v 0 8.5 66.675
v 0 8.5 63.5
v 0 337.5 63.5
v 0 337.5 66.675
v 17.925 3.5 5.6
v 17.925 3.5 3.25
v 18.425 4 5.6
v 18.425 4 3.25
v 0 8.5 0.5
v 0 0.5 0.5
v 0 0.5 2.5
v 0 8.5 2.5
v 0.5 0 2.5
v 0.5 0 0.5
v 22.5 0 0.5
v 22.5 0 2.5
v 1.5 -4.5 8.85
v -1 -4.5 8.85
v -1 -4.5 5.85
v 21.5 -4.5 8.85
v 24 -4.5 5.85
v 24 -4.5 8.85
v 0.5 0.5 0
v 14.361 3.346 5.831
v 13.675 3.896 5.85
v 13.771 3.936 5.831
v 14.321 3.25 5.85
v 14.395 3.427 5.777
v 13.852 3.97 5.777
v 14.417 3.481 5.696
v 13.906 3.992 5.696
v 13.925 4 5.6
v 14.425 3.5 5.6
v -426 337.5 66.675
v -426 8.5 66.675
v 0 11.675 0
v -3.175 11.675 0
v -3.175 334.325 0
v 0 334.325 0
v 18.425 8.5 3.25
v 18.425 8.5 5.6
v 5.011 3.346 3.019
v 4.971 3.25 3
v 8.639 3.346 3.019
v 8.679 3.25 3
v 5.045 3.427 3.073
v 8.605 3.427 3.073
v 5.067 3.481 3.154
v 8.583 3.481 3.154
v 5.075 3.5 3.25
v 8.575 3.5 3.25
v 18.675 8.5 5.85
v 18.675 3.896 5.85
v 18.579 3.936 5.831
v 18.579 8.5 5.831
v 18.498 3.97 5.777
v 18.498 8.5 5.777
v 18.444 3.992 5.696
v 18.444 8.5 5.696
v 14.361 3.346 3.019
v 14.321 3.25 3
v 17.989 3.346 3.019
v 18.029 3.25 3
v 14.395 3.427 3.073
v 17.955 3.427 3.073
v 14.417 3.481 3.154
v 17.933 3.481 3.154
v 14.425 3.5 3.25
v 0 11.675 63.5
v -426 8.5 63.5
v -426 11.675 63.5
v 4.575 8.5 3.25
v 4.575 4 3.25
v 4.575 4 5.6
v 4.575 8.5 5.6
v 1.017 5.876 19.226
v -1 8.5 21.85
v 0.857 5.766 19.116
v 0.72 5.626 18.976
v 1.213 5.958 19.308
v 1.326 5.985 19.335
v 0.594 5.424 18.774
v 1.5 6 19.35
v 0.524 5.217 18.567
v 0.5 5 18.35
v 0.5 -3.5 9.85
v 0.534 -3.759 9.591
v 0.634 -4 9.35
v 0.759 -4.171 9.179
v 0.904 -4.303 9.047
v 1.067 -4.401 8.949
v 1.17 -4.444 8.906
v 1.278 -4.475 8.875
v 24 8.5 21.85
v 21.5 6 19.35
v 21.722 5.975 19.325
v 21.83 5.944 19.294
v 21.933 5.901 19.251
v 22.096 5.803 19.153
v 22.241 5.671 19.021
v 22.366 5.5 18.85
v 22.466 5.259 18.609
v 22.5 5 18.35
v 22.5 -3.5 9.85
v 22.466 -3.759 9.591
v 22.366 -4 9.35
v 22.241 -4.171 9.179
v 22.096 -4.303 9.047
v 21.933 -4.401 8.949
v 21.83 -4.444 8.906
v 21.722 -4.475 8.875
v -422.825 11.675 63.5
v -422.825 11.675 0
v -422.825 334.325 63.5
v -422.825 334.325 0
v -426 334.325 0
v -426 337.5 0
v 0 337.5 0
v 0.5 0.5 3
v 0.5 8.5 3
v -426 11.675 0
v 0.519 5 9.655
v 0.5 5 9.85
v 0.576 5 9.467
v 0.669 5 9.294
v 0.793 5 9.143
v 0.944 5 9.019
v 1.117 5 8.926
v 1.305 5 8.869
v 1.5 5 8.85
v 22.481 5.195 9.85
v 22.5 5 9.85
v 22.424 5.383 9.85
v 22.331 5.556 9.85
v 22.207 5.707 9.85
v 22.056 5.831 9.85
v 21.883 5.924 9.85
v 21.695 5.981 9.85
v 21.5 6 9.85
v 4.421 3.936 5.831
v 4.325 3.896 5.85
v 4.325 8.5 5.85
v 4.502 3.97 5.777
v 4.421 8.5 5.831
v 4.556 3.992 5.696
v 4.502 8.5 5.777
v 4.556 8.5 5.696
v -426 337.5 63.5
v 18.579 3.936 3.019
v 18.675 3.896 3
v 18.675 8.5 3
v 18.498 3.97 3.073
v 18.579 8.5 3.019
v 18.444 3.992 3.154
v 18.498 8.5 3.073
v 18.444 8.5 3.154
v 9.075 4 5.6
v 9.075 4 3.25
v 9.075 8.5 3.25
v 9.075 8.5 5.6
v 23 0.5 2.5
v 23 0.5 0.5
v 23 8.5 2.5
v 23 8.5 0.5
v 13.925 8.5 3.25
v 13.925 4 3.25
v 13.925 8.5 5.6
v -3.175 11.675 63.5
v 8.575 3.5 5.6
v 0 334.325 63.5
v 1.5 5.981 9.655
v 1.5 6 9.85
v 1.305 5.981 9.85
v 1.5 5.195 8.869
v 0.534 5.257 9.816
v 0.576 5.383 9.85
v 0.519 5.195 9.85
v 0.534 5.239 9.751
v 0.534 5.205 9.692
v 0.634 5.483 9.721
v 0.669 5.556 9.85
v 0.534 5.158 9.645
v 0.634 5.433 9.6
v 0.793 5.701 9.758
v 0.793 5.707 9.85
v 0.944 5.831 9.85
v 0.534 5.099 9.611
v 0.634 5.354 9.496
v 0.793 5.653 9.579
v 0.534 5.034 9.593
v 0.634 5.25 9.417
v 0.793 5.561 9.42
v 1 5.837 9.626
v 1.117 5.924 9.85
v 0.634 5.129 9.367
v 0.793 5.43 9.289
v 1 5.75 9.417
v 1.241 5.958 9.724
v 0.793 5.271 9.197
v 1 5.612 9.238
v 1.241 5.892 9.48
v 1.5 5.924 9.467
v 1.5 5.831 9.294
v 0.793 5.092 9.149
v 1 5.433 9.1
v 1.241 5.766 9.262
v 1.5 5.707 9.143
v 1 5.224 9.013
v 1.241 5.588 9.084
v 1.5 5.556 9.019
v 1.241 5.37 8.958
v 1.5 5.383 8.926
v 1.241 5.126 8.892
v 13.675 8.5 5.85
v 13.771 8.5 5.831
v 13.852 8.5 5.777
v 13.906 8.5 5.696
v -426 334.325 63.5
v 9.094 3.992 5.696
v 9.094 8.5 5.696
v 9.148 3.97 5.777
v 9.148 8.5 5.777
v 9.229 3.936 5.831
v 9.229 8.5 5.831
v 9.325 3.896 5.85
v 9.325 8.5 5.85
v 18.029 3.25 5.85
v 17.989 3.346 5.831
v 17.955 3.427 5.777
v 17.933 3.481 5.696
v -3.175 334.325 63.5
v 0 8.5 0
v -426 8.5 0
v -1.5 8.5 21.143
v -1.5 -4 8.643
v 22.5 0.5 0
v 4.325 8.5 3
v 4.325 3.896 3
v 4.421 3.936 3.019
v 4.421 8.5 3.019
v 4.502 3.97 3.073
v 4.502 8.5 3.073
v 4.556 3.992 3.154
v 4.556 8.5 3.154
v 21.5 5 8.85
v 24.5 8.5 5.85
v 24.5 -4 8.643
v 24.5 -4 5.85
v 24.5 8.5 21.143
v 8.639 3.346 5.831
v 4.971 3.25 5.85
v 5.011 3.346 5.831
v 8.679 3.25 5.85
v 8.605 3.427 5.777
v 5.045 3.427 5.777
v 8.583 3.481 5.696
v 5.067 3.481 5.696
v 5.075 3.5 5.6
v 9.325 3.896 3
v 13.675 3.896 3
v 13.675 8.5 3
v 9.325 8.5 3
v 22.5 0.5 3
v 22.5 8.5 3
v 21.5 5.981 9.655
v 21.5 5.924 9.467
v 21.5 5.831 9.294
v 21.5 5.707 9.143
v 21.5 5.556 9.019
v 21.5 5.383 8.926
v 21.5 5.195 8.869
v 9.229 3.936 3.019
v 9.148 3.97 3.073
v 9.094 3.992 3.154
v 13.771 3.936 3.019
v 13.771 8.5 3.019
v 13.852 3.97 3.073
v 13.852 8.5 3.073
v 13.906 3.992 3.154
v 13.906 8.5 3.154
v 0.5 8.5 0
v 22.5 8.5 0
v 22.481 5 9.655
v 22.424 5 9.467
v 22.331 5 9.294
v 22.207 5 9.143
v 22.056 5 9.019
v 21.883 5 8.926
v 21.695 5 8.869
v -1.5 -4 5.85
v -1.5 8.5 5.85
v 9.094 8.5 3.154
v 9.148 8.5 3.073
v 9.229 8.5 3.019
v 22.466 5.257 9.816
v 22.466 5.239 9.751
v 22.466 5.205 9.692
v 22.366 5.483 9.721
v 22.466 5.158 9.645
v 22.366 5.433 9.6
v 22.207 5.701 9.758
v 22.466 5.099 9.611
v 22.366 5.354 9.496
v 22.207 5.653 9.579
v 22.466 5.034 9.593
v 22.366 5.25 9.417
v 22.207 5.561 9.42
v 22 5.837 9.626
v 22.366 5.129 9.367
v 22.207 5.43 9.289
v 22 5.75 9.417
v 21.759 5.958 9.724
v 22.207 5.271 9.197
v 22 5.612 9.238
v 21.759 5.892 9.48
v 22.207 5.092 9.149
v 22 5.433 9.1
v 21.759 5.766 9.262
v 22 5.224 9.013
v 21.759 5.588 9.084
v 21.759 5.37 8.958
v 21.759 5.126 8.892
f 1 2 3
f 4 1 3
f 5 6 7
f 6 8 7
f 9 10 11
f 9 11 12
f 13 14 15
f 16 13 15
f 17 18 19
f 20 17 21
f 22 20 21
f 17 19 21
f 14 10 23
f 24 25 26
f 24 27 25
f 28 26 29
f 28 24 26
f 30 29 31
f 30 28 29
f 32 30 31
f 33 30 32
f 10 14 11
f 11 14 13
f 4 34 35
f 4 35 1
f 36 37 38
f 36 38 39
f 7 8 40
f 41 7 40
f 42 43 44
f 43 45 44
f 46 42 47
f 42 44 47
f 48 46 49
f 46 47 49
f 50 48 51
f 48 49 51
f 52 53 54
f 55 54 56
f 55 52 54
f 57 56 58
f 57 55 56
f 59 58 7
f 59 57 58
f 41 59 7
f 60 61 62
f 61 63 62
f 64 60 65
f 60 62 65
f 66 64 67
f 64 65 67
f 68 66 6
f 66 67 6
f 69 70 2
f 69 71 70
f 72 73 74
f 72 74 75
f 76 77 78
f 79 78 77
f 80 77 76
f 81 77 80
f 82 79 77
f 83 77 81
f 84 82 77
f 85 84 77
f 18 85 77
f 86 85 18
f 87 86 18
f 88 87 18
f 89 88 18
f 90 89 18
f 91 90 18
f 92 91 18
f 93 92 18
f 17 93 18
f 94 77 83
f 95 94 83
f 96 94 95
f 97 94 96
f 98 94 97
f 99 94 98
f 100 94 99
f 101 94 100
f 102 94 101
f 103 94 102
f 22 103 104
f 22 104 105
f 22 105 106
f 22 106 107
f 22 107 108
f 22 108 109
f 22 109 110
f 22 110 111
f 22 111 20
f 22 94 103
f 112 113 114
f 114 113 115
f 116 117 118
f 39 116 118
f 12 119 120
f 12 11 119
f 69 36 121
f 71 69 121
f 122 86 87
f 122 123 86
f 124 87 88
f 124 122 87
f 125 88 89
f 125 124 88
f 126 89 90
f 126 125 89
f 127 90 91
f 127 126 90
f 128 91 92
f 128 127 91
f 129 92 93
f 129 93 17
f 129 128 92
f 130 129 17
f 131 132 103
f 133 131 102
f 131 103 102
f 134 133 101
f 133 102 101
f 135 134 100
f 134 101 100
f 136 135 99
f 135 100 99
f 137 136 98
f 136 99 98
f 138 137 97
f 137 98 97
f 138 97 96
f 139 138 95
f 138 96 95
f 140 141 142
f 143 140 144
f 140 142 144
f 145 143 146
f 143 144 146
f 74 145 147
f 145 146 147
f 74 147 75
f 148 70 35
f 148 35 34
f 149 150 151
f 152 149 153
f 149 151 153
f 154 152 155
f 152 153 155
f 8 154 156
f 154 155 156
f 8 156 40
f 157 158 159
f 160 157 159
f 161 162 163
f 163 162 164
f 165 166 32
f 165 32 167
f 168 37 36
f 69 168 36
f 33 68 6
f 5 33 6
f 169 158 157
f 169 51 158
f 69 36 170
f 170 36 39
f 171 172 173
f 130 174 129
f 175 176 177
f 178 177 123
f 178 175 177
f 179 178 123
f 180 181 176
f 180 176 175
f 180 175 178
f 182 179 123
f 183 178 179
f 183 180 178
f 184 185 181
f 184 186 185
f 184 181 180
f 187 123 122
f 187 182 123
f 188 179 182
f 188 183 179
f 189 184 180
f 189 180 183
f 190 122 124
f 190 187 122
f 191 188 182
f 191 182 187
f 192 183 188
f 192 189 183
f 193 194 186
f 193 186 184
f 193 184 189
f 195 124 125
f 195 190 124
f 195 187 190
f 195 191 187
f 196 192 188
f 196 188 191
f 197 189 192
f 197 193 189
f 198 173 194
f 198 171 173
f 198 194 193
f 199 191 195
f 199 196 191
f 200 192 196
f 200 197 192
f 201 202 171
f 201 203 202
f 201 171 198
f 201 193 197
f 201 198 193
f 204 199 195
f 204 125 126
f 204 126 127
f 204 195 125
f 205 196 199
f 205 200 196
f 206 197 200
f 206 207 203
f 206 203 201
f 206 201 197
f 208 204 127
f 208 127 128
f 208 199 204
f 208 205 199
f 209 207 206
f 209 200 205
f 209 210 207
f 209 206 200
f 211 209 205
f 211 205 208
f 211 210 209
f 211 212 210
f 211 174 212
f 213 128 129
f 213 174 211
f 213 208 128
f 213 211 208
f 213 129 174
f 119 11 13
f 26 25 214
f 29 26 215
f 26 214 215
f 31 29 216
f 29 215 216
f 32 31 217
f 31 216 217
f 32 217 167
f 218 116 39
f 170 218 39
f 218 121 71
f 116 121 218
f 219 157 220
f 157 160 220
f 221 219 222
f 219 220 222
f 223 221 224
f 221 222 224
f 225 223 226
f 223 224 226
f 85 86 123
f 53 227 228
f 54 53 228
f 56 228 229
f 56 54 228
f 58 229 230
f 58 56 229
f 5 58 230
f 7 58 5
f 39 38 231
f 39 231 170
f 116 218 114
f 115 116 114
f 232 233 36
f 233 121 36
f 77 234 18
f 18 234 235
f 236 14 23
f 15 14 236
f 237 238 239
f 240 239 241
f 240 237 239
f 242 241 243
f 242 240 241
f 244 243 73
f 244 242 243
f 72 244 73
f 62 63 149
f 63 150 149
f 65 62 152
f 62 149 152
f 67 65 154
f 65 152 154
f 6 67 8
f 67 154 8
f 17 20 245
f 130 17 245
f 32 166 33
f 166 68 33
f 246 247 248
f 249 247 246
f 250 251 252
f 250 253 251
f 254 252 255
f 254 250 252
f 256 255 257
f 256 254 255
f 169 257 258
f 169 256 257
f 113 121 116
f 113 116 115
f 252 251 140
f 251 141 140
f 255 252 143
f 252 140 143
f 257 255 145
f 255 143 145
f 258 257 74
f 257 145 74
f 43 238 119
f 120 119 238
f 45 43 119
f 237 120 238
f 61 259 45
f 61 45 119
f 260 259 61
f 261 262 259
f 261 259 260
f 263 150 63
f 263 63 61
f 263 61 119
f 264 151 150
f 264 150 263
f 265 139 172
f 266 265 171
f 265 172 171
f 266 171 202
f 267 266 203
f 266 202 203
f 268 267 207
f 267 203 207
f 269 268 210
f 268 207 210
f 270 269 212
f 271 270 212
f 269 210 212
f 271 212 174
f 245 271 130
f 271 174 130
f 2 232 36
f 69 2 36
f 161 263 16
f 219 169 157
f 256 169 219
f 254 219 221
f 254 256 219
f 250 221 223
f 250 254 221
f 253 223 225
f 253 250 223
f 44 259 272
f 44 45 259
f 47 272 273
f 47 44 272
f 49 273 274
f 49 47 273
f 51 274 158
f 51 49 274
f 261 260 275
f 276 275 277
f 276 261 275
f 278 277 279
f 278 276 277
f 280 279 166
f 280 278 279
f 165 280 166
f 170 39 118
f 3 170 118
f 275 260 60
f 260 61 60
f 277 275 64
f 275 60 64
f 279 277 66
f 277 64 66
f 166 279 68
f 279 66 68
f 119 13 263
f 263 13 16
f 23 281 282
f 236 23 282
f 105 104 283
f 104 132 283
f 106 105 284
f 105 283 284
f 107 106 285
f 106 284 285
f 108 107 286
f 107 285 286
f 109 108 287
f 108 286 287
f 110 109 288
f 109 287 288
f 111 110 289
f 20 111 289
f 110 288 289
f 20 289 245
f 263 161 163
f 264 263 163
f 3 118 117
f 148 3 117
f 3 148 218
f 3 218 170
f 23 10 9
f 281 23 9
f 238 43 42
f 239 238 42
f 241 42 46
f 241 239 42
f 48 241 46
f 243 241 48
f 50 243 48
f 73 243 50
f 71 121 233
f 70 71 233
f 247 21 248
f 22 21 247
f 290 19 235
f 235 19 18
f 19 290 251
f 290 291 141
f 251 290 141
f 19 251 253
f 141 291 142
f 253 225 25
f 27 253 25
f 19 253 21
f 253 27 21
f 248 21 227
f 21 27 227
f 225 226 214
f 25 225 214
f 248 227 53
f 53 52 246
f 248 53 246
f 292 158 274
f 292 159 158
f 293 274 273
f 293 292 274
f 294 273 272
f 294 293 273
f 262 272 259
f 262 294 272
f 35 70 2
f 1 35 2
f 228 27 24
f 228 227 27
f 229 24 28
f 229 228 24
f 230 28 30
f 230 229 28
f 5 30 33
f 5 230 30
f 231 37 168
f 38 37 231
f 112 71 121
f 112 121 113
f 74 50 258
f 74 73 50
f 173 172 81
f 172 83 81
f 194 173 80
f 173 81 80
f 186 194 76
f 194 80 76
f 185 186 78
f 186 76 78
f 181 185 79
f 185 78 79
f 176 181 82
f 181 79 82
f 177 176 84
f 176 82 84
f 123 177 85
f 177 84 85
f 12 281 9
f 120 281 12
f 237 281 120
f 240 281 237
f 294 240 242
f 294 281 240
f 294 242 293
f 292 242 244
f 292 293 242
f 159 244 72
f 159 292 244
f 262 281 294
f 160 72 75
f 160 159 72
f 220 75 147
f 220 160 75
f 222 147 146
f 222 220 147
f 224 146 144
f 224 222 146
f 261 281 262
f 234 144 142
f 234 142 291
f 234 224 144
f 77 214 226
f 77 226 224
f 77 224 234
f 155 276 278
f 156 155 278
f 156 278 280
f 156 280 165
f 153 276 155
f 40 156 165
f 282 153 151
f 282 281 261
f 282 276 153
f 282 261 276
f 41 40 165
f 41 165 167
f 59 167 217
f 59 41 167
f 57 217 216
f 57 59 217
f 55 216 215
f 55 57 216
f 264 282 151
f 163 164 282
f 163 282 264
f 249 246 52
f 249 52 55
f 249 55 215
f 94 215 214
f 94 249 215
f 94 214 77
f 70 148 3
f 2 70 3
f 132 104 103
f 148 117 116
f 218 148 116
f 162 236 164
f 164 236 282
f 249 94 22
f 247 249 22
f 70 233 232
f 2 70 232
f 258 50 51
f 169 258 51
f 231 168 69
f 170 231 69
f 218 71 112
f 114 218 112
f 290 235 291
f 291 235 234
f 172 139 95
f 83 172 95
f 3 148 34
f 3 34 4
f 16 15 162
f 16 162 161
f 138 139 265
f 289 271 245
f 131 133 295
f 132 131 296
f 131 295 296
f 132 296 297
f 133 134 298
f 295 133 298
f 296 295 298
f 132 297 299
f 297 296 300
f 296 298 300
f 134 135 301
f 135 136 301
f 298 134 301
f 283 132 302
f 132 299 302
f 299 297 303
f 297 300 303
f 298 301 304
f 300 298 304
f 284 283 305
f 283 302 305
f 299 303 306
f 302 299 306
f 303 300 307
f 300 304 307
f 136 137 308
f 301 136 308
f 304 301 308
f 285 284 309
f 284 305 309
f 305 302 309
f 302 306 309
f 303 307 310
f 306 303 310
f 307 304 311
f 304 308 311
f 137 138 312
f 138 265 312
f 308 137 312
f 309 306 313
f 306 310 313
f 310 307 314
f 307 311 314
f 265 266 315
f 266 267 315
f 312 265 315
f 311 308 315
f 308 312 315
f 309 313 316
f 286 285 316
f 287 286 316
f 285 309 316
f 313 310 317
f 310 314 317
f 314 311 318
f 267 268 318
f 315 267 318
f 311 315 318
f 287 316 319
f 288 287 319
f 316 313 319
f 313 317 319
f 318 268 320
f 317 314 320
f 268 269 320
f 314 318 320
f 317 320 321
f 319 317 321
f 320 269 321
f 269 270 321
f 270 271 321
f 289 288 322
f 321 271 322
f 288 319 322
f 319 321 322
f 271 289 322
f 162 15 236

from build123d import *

# Parameters (mm, degrees)
F0_W      = 23
F0_H      = 8.5
F1_DEPTH  = 3
F2_W      = 4.5
F2_H      = 5
F3_DEPTH  = 2.85
F4_W      = 26
F4_H      = 13
F5_DEPTH  = 3
F7_DEPTH  = 26
F8_SIZE   = 0.5
F9_R      = 0.25
F10_SIZE  = 0.5
F12_DEPTH = 63.5
F11_W     = 3.175
F11_H     = 322.65
F13_DEPTH = 63.5
F14_W     = 426
F14_H     = 329
F15_DEPTH = 3.175
F17_START = -2
F17_DEPTH = 22
F18_SIZE  = 0.5
F19_R     = 1


# Not quite as in the source:
# - a length typed as a fraction of an inch, garbled in the dataset ("3 / 203.2 mm" for 3/8 in), is restored


with BuildPart() as f1:
    # F0 (on Top) → F1 (new body)
    with BuildSketch(Plane.XY):
        with Locations((11.5, 4.25)):
            Rectangle(F0_W, F0_H)
    extrude(amount=F1_DEPTH)

    # F2 (on face) → F3 (join)
    with BuildSketch(Plane.XY.offset(3)):
        with Locations((6.825, 6)):
            Rectangle(F2_W, F2_H)
        with Locations((16.175, 6)):
            Rectangle(F2_W, F2_H)
    extrude(amount=F3_DEPTH)

    # F4 (on face) → F5 (join)
    with BuildSketch(Plane.XY.offset(5.85)):
        with Locations((11.5, 2)):
            Rectangle(F4_W, F4_H)
    extrude(amount=F5_DEPTH)

    # F6 (on face) → F7 (join, through all)
    with BuildSketch(Plane.YZ.offset(24.5)):
        Polygon((-4.5, 8.85), (8.5, 8.85), (8.5, 21.85), align=None)
    extrude(amount=-F7_DEPTH)

    # F8
    f8_edges = [f1.edges().sort_by_distance(p)[0] for p in [
        (4.575, 3.5, 4.425),
        (9.075, 3.5, 4.425),
        (13.925, 3.5, 4.425),
        (18.425, 3.5, 4.425),
    ]]
    chamfer(f8_edges, length=F8_SIZE)

    # F9
    f9_edges = [f1.edges().sort_by_distance(p)[0] for p in [
        (4.575, 6.25, 5.85),
        (4.825, 3.75, 5.85),
        (6.825, 3.5, 5.85),
        (8.825, 3.75, 5.85),
        (9.075, 6.25, 5.85),
        (13.925, 6.25, 5.85),
        (14.175, 3.75, 5.85),
        (16.175, 3.5, 5.85),
        (18.175, 3.75, 5.85),
        (18.425, 6.25, 5.85),
        (18.425, 6.25, 3),
        (18.175, 3.75, 3),
        (16.175, 3.5, 3),
        (14.175, 3.75, 3),
        (13.925, 6.25, 3),
        (6.825, 3.5, 3),
        (4.825, 3.75, 3),
        (4.575, 6.25, 3),
        (8.825, 3.75, 3),
        (9.075, 6.25, 3),
    ]]
    fillet(f9_edges, radius=F9_R)

    # F10
    f10_edges = [f1.edges().sort_by_distance(p)[0] for p in [
        (0, 4.25, 3),
        (0, 0, 1.5),
        (0, 4.25, 0),
        (11.5, 0, 3),
        (11.5, 0, 0),
        (23, 4.25, 3),
        (23, 0, 1.5),
        (23, 4.25, 0),
    ]]
    chamfer(f10_edges, length=F10_SIZE)

    # F16 (on face) → F17 (cut)
    with BuildSketch(Plane.YZ.offset(24.5).offset(F17_START)):
        Polygon((6, 19.35), (-4.5, 8.85), (6, 8.85), align=None)
    extrude(amount=-F17_DEPTH, mode=Mode.SUBTRACT)

    # F18
    f18_edges = [f1.edges().sort_by_distance(p)[0] for p in [
        (24.5, 2, 15.35),
        (24.5, -4.5, 7.35),
        (-1.5, -4.5, 7.35),
        (-1.5, 2, 15.35),
    ]]
    chamfer(f18_edges, length=F18_SIZE)

    # F19
    f19_edges = [f1.edges().sort_by_distance(p)[0] for p in [
        (11.5, 6, 8.85),
        (0.5, 6, 14.1),
        (0.5, 0.75, 8.85),
        (22.5, 6, 14.1),
        (22.5, 0.75, 8.85),
    ]]
    fillet(f19_edges, radius=F19_R)


with BuildPart() as f12:
    # F11 (on Top) → F12 (new body)
    with BuildSketch(Plane.XY):
        Polygon((-426, 8.5), (0, 8.5), (0, 11.675), (-3.175, 11.675), (-422.825, 11.675), (-426, 11.675), align=None)
    extrude(amount=F12_DEPTH)


with BuildPart() as f12b:
    # F11 (on Top) → F12, piece 2 (new body)
    with BuildSketch(Plane.XY):
        Polygon((-3.175, 334.325), (0, 334.325), (0, 337.5), (-426, 337.5), (-426, 334.325), (-422.825, 334.325), align=None)
    extrude(amount=F12_DEPTH)


with BuildPart() as f13:
    # F11 (on Top) → F13 (new body, through all)
    with BuildSketch(Plane.XY):
        with Locations((-1.5875, 173)):
            Rectangle(F11_W, F11_H)
    extrude(amount=F13_DEPTH)


with BuildPart() as f13b:
    # F11 (on Top) → F13, piece 2 (new body, through all)
    with BuildSketch(Plane.XY):
        with Locations((-424.4125, 173)):
            Rectangle(F11_W, F11_H)
    extrude(amount=F13_DEPTH)


with BuildPart() as f15:
    # F14 (on face) → F15 (new body)
    with BuildSketch(Plane.XY.offset(63.5)):
        with Locations((-213, 173)):
            Rectangle(F14_W, F14_H)
    extrude(amount=F15_DEPTH)


solid = Compound([f1.part, f12.part, f12b.part, f13.part, f13b.part, f15.part])
